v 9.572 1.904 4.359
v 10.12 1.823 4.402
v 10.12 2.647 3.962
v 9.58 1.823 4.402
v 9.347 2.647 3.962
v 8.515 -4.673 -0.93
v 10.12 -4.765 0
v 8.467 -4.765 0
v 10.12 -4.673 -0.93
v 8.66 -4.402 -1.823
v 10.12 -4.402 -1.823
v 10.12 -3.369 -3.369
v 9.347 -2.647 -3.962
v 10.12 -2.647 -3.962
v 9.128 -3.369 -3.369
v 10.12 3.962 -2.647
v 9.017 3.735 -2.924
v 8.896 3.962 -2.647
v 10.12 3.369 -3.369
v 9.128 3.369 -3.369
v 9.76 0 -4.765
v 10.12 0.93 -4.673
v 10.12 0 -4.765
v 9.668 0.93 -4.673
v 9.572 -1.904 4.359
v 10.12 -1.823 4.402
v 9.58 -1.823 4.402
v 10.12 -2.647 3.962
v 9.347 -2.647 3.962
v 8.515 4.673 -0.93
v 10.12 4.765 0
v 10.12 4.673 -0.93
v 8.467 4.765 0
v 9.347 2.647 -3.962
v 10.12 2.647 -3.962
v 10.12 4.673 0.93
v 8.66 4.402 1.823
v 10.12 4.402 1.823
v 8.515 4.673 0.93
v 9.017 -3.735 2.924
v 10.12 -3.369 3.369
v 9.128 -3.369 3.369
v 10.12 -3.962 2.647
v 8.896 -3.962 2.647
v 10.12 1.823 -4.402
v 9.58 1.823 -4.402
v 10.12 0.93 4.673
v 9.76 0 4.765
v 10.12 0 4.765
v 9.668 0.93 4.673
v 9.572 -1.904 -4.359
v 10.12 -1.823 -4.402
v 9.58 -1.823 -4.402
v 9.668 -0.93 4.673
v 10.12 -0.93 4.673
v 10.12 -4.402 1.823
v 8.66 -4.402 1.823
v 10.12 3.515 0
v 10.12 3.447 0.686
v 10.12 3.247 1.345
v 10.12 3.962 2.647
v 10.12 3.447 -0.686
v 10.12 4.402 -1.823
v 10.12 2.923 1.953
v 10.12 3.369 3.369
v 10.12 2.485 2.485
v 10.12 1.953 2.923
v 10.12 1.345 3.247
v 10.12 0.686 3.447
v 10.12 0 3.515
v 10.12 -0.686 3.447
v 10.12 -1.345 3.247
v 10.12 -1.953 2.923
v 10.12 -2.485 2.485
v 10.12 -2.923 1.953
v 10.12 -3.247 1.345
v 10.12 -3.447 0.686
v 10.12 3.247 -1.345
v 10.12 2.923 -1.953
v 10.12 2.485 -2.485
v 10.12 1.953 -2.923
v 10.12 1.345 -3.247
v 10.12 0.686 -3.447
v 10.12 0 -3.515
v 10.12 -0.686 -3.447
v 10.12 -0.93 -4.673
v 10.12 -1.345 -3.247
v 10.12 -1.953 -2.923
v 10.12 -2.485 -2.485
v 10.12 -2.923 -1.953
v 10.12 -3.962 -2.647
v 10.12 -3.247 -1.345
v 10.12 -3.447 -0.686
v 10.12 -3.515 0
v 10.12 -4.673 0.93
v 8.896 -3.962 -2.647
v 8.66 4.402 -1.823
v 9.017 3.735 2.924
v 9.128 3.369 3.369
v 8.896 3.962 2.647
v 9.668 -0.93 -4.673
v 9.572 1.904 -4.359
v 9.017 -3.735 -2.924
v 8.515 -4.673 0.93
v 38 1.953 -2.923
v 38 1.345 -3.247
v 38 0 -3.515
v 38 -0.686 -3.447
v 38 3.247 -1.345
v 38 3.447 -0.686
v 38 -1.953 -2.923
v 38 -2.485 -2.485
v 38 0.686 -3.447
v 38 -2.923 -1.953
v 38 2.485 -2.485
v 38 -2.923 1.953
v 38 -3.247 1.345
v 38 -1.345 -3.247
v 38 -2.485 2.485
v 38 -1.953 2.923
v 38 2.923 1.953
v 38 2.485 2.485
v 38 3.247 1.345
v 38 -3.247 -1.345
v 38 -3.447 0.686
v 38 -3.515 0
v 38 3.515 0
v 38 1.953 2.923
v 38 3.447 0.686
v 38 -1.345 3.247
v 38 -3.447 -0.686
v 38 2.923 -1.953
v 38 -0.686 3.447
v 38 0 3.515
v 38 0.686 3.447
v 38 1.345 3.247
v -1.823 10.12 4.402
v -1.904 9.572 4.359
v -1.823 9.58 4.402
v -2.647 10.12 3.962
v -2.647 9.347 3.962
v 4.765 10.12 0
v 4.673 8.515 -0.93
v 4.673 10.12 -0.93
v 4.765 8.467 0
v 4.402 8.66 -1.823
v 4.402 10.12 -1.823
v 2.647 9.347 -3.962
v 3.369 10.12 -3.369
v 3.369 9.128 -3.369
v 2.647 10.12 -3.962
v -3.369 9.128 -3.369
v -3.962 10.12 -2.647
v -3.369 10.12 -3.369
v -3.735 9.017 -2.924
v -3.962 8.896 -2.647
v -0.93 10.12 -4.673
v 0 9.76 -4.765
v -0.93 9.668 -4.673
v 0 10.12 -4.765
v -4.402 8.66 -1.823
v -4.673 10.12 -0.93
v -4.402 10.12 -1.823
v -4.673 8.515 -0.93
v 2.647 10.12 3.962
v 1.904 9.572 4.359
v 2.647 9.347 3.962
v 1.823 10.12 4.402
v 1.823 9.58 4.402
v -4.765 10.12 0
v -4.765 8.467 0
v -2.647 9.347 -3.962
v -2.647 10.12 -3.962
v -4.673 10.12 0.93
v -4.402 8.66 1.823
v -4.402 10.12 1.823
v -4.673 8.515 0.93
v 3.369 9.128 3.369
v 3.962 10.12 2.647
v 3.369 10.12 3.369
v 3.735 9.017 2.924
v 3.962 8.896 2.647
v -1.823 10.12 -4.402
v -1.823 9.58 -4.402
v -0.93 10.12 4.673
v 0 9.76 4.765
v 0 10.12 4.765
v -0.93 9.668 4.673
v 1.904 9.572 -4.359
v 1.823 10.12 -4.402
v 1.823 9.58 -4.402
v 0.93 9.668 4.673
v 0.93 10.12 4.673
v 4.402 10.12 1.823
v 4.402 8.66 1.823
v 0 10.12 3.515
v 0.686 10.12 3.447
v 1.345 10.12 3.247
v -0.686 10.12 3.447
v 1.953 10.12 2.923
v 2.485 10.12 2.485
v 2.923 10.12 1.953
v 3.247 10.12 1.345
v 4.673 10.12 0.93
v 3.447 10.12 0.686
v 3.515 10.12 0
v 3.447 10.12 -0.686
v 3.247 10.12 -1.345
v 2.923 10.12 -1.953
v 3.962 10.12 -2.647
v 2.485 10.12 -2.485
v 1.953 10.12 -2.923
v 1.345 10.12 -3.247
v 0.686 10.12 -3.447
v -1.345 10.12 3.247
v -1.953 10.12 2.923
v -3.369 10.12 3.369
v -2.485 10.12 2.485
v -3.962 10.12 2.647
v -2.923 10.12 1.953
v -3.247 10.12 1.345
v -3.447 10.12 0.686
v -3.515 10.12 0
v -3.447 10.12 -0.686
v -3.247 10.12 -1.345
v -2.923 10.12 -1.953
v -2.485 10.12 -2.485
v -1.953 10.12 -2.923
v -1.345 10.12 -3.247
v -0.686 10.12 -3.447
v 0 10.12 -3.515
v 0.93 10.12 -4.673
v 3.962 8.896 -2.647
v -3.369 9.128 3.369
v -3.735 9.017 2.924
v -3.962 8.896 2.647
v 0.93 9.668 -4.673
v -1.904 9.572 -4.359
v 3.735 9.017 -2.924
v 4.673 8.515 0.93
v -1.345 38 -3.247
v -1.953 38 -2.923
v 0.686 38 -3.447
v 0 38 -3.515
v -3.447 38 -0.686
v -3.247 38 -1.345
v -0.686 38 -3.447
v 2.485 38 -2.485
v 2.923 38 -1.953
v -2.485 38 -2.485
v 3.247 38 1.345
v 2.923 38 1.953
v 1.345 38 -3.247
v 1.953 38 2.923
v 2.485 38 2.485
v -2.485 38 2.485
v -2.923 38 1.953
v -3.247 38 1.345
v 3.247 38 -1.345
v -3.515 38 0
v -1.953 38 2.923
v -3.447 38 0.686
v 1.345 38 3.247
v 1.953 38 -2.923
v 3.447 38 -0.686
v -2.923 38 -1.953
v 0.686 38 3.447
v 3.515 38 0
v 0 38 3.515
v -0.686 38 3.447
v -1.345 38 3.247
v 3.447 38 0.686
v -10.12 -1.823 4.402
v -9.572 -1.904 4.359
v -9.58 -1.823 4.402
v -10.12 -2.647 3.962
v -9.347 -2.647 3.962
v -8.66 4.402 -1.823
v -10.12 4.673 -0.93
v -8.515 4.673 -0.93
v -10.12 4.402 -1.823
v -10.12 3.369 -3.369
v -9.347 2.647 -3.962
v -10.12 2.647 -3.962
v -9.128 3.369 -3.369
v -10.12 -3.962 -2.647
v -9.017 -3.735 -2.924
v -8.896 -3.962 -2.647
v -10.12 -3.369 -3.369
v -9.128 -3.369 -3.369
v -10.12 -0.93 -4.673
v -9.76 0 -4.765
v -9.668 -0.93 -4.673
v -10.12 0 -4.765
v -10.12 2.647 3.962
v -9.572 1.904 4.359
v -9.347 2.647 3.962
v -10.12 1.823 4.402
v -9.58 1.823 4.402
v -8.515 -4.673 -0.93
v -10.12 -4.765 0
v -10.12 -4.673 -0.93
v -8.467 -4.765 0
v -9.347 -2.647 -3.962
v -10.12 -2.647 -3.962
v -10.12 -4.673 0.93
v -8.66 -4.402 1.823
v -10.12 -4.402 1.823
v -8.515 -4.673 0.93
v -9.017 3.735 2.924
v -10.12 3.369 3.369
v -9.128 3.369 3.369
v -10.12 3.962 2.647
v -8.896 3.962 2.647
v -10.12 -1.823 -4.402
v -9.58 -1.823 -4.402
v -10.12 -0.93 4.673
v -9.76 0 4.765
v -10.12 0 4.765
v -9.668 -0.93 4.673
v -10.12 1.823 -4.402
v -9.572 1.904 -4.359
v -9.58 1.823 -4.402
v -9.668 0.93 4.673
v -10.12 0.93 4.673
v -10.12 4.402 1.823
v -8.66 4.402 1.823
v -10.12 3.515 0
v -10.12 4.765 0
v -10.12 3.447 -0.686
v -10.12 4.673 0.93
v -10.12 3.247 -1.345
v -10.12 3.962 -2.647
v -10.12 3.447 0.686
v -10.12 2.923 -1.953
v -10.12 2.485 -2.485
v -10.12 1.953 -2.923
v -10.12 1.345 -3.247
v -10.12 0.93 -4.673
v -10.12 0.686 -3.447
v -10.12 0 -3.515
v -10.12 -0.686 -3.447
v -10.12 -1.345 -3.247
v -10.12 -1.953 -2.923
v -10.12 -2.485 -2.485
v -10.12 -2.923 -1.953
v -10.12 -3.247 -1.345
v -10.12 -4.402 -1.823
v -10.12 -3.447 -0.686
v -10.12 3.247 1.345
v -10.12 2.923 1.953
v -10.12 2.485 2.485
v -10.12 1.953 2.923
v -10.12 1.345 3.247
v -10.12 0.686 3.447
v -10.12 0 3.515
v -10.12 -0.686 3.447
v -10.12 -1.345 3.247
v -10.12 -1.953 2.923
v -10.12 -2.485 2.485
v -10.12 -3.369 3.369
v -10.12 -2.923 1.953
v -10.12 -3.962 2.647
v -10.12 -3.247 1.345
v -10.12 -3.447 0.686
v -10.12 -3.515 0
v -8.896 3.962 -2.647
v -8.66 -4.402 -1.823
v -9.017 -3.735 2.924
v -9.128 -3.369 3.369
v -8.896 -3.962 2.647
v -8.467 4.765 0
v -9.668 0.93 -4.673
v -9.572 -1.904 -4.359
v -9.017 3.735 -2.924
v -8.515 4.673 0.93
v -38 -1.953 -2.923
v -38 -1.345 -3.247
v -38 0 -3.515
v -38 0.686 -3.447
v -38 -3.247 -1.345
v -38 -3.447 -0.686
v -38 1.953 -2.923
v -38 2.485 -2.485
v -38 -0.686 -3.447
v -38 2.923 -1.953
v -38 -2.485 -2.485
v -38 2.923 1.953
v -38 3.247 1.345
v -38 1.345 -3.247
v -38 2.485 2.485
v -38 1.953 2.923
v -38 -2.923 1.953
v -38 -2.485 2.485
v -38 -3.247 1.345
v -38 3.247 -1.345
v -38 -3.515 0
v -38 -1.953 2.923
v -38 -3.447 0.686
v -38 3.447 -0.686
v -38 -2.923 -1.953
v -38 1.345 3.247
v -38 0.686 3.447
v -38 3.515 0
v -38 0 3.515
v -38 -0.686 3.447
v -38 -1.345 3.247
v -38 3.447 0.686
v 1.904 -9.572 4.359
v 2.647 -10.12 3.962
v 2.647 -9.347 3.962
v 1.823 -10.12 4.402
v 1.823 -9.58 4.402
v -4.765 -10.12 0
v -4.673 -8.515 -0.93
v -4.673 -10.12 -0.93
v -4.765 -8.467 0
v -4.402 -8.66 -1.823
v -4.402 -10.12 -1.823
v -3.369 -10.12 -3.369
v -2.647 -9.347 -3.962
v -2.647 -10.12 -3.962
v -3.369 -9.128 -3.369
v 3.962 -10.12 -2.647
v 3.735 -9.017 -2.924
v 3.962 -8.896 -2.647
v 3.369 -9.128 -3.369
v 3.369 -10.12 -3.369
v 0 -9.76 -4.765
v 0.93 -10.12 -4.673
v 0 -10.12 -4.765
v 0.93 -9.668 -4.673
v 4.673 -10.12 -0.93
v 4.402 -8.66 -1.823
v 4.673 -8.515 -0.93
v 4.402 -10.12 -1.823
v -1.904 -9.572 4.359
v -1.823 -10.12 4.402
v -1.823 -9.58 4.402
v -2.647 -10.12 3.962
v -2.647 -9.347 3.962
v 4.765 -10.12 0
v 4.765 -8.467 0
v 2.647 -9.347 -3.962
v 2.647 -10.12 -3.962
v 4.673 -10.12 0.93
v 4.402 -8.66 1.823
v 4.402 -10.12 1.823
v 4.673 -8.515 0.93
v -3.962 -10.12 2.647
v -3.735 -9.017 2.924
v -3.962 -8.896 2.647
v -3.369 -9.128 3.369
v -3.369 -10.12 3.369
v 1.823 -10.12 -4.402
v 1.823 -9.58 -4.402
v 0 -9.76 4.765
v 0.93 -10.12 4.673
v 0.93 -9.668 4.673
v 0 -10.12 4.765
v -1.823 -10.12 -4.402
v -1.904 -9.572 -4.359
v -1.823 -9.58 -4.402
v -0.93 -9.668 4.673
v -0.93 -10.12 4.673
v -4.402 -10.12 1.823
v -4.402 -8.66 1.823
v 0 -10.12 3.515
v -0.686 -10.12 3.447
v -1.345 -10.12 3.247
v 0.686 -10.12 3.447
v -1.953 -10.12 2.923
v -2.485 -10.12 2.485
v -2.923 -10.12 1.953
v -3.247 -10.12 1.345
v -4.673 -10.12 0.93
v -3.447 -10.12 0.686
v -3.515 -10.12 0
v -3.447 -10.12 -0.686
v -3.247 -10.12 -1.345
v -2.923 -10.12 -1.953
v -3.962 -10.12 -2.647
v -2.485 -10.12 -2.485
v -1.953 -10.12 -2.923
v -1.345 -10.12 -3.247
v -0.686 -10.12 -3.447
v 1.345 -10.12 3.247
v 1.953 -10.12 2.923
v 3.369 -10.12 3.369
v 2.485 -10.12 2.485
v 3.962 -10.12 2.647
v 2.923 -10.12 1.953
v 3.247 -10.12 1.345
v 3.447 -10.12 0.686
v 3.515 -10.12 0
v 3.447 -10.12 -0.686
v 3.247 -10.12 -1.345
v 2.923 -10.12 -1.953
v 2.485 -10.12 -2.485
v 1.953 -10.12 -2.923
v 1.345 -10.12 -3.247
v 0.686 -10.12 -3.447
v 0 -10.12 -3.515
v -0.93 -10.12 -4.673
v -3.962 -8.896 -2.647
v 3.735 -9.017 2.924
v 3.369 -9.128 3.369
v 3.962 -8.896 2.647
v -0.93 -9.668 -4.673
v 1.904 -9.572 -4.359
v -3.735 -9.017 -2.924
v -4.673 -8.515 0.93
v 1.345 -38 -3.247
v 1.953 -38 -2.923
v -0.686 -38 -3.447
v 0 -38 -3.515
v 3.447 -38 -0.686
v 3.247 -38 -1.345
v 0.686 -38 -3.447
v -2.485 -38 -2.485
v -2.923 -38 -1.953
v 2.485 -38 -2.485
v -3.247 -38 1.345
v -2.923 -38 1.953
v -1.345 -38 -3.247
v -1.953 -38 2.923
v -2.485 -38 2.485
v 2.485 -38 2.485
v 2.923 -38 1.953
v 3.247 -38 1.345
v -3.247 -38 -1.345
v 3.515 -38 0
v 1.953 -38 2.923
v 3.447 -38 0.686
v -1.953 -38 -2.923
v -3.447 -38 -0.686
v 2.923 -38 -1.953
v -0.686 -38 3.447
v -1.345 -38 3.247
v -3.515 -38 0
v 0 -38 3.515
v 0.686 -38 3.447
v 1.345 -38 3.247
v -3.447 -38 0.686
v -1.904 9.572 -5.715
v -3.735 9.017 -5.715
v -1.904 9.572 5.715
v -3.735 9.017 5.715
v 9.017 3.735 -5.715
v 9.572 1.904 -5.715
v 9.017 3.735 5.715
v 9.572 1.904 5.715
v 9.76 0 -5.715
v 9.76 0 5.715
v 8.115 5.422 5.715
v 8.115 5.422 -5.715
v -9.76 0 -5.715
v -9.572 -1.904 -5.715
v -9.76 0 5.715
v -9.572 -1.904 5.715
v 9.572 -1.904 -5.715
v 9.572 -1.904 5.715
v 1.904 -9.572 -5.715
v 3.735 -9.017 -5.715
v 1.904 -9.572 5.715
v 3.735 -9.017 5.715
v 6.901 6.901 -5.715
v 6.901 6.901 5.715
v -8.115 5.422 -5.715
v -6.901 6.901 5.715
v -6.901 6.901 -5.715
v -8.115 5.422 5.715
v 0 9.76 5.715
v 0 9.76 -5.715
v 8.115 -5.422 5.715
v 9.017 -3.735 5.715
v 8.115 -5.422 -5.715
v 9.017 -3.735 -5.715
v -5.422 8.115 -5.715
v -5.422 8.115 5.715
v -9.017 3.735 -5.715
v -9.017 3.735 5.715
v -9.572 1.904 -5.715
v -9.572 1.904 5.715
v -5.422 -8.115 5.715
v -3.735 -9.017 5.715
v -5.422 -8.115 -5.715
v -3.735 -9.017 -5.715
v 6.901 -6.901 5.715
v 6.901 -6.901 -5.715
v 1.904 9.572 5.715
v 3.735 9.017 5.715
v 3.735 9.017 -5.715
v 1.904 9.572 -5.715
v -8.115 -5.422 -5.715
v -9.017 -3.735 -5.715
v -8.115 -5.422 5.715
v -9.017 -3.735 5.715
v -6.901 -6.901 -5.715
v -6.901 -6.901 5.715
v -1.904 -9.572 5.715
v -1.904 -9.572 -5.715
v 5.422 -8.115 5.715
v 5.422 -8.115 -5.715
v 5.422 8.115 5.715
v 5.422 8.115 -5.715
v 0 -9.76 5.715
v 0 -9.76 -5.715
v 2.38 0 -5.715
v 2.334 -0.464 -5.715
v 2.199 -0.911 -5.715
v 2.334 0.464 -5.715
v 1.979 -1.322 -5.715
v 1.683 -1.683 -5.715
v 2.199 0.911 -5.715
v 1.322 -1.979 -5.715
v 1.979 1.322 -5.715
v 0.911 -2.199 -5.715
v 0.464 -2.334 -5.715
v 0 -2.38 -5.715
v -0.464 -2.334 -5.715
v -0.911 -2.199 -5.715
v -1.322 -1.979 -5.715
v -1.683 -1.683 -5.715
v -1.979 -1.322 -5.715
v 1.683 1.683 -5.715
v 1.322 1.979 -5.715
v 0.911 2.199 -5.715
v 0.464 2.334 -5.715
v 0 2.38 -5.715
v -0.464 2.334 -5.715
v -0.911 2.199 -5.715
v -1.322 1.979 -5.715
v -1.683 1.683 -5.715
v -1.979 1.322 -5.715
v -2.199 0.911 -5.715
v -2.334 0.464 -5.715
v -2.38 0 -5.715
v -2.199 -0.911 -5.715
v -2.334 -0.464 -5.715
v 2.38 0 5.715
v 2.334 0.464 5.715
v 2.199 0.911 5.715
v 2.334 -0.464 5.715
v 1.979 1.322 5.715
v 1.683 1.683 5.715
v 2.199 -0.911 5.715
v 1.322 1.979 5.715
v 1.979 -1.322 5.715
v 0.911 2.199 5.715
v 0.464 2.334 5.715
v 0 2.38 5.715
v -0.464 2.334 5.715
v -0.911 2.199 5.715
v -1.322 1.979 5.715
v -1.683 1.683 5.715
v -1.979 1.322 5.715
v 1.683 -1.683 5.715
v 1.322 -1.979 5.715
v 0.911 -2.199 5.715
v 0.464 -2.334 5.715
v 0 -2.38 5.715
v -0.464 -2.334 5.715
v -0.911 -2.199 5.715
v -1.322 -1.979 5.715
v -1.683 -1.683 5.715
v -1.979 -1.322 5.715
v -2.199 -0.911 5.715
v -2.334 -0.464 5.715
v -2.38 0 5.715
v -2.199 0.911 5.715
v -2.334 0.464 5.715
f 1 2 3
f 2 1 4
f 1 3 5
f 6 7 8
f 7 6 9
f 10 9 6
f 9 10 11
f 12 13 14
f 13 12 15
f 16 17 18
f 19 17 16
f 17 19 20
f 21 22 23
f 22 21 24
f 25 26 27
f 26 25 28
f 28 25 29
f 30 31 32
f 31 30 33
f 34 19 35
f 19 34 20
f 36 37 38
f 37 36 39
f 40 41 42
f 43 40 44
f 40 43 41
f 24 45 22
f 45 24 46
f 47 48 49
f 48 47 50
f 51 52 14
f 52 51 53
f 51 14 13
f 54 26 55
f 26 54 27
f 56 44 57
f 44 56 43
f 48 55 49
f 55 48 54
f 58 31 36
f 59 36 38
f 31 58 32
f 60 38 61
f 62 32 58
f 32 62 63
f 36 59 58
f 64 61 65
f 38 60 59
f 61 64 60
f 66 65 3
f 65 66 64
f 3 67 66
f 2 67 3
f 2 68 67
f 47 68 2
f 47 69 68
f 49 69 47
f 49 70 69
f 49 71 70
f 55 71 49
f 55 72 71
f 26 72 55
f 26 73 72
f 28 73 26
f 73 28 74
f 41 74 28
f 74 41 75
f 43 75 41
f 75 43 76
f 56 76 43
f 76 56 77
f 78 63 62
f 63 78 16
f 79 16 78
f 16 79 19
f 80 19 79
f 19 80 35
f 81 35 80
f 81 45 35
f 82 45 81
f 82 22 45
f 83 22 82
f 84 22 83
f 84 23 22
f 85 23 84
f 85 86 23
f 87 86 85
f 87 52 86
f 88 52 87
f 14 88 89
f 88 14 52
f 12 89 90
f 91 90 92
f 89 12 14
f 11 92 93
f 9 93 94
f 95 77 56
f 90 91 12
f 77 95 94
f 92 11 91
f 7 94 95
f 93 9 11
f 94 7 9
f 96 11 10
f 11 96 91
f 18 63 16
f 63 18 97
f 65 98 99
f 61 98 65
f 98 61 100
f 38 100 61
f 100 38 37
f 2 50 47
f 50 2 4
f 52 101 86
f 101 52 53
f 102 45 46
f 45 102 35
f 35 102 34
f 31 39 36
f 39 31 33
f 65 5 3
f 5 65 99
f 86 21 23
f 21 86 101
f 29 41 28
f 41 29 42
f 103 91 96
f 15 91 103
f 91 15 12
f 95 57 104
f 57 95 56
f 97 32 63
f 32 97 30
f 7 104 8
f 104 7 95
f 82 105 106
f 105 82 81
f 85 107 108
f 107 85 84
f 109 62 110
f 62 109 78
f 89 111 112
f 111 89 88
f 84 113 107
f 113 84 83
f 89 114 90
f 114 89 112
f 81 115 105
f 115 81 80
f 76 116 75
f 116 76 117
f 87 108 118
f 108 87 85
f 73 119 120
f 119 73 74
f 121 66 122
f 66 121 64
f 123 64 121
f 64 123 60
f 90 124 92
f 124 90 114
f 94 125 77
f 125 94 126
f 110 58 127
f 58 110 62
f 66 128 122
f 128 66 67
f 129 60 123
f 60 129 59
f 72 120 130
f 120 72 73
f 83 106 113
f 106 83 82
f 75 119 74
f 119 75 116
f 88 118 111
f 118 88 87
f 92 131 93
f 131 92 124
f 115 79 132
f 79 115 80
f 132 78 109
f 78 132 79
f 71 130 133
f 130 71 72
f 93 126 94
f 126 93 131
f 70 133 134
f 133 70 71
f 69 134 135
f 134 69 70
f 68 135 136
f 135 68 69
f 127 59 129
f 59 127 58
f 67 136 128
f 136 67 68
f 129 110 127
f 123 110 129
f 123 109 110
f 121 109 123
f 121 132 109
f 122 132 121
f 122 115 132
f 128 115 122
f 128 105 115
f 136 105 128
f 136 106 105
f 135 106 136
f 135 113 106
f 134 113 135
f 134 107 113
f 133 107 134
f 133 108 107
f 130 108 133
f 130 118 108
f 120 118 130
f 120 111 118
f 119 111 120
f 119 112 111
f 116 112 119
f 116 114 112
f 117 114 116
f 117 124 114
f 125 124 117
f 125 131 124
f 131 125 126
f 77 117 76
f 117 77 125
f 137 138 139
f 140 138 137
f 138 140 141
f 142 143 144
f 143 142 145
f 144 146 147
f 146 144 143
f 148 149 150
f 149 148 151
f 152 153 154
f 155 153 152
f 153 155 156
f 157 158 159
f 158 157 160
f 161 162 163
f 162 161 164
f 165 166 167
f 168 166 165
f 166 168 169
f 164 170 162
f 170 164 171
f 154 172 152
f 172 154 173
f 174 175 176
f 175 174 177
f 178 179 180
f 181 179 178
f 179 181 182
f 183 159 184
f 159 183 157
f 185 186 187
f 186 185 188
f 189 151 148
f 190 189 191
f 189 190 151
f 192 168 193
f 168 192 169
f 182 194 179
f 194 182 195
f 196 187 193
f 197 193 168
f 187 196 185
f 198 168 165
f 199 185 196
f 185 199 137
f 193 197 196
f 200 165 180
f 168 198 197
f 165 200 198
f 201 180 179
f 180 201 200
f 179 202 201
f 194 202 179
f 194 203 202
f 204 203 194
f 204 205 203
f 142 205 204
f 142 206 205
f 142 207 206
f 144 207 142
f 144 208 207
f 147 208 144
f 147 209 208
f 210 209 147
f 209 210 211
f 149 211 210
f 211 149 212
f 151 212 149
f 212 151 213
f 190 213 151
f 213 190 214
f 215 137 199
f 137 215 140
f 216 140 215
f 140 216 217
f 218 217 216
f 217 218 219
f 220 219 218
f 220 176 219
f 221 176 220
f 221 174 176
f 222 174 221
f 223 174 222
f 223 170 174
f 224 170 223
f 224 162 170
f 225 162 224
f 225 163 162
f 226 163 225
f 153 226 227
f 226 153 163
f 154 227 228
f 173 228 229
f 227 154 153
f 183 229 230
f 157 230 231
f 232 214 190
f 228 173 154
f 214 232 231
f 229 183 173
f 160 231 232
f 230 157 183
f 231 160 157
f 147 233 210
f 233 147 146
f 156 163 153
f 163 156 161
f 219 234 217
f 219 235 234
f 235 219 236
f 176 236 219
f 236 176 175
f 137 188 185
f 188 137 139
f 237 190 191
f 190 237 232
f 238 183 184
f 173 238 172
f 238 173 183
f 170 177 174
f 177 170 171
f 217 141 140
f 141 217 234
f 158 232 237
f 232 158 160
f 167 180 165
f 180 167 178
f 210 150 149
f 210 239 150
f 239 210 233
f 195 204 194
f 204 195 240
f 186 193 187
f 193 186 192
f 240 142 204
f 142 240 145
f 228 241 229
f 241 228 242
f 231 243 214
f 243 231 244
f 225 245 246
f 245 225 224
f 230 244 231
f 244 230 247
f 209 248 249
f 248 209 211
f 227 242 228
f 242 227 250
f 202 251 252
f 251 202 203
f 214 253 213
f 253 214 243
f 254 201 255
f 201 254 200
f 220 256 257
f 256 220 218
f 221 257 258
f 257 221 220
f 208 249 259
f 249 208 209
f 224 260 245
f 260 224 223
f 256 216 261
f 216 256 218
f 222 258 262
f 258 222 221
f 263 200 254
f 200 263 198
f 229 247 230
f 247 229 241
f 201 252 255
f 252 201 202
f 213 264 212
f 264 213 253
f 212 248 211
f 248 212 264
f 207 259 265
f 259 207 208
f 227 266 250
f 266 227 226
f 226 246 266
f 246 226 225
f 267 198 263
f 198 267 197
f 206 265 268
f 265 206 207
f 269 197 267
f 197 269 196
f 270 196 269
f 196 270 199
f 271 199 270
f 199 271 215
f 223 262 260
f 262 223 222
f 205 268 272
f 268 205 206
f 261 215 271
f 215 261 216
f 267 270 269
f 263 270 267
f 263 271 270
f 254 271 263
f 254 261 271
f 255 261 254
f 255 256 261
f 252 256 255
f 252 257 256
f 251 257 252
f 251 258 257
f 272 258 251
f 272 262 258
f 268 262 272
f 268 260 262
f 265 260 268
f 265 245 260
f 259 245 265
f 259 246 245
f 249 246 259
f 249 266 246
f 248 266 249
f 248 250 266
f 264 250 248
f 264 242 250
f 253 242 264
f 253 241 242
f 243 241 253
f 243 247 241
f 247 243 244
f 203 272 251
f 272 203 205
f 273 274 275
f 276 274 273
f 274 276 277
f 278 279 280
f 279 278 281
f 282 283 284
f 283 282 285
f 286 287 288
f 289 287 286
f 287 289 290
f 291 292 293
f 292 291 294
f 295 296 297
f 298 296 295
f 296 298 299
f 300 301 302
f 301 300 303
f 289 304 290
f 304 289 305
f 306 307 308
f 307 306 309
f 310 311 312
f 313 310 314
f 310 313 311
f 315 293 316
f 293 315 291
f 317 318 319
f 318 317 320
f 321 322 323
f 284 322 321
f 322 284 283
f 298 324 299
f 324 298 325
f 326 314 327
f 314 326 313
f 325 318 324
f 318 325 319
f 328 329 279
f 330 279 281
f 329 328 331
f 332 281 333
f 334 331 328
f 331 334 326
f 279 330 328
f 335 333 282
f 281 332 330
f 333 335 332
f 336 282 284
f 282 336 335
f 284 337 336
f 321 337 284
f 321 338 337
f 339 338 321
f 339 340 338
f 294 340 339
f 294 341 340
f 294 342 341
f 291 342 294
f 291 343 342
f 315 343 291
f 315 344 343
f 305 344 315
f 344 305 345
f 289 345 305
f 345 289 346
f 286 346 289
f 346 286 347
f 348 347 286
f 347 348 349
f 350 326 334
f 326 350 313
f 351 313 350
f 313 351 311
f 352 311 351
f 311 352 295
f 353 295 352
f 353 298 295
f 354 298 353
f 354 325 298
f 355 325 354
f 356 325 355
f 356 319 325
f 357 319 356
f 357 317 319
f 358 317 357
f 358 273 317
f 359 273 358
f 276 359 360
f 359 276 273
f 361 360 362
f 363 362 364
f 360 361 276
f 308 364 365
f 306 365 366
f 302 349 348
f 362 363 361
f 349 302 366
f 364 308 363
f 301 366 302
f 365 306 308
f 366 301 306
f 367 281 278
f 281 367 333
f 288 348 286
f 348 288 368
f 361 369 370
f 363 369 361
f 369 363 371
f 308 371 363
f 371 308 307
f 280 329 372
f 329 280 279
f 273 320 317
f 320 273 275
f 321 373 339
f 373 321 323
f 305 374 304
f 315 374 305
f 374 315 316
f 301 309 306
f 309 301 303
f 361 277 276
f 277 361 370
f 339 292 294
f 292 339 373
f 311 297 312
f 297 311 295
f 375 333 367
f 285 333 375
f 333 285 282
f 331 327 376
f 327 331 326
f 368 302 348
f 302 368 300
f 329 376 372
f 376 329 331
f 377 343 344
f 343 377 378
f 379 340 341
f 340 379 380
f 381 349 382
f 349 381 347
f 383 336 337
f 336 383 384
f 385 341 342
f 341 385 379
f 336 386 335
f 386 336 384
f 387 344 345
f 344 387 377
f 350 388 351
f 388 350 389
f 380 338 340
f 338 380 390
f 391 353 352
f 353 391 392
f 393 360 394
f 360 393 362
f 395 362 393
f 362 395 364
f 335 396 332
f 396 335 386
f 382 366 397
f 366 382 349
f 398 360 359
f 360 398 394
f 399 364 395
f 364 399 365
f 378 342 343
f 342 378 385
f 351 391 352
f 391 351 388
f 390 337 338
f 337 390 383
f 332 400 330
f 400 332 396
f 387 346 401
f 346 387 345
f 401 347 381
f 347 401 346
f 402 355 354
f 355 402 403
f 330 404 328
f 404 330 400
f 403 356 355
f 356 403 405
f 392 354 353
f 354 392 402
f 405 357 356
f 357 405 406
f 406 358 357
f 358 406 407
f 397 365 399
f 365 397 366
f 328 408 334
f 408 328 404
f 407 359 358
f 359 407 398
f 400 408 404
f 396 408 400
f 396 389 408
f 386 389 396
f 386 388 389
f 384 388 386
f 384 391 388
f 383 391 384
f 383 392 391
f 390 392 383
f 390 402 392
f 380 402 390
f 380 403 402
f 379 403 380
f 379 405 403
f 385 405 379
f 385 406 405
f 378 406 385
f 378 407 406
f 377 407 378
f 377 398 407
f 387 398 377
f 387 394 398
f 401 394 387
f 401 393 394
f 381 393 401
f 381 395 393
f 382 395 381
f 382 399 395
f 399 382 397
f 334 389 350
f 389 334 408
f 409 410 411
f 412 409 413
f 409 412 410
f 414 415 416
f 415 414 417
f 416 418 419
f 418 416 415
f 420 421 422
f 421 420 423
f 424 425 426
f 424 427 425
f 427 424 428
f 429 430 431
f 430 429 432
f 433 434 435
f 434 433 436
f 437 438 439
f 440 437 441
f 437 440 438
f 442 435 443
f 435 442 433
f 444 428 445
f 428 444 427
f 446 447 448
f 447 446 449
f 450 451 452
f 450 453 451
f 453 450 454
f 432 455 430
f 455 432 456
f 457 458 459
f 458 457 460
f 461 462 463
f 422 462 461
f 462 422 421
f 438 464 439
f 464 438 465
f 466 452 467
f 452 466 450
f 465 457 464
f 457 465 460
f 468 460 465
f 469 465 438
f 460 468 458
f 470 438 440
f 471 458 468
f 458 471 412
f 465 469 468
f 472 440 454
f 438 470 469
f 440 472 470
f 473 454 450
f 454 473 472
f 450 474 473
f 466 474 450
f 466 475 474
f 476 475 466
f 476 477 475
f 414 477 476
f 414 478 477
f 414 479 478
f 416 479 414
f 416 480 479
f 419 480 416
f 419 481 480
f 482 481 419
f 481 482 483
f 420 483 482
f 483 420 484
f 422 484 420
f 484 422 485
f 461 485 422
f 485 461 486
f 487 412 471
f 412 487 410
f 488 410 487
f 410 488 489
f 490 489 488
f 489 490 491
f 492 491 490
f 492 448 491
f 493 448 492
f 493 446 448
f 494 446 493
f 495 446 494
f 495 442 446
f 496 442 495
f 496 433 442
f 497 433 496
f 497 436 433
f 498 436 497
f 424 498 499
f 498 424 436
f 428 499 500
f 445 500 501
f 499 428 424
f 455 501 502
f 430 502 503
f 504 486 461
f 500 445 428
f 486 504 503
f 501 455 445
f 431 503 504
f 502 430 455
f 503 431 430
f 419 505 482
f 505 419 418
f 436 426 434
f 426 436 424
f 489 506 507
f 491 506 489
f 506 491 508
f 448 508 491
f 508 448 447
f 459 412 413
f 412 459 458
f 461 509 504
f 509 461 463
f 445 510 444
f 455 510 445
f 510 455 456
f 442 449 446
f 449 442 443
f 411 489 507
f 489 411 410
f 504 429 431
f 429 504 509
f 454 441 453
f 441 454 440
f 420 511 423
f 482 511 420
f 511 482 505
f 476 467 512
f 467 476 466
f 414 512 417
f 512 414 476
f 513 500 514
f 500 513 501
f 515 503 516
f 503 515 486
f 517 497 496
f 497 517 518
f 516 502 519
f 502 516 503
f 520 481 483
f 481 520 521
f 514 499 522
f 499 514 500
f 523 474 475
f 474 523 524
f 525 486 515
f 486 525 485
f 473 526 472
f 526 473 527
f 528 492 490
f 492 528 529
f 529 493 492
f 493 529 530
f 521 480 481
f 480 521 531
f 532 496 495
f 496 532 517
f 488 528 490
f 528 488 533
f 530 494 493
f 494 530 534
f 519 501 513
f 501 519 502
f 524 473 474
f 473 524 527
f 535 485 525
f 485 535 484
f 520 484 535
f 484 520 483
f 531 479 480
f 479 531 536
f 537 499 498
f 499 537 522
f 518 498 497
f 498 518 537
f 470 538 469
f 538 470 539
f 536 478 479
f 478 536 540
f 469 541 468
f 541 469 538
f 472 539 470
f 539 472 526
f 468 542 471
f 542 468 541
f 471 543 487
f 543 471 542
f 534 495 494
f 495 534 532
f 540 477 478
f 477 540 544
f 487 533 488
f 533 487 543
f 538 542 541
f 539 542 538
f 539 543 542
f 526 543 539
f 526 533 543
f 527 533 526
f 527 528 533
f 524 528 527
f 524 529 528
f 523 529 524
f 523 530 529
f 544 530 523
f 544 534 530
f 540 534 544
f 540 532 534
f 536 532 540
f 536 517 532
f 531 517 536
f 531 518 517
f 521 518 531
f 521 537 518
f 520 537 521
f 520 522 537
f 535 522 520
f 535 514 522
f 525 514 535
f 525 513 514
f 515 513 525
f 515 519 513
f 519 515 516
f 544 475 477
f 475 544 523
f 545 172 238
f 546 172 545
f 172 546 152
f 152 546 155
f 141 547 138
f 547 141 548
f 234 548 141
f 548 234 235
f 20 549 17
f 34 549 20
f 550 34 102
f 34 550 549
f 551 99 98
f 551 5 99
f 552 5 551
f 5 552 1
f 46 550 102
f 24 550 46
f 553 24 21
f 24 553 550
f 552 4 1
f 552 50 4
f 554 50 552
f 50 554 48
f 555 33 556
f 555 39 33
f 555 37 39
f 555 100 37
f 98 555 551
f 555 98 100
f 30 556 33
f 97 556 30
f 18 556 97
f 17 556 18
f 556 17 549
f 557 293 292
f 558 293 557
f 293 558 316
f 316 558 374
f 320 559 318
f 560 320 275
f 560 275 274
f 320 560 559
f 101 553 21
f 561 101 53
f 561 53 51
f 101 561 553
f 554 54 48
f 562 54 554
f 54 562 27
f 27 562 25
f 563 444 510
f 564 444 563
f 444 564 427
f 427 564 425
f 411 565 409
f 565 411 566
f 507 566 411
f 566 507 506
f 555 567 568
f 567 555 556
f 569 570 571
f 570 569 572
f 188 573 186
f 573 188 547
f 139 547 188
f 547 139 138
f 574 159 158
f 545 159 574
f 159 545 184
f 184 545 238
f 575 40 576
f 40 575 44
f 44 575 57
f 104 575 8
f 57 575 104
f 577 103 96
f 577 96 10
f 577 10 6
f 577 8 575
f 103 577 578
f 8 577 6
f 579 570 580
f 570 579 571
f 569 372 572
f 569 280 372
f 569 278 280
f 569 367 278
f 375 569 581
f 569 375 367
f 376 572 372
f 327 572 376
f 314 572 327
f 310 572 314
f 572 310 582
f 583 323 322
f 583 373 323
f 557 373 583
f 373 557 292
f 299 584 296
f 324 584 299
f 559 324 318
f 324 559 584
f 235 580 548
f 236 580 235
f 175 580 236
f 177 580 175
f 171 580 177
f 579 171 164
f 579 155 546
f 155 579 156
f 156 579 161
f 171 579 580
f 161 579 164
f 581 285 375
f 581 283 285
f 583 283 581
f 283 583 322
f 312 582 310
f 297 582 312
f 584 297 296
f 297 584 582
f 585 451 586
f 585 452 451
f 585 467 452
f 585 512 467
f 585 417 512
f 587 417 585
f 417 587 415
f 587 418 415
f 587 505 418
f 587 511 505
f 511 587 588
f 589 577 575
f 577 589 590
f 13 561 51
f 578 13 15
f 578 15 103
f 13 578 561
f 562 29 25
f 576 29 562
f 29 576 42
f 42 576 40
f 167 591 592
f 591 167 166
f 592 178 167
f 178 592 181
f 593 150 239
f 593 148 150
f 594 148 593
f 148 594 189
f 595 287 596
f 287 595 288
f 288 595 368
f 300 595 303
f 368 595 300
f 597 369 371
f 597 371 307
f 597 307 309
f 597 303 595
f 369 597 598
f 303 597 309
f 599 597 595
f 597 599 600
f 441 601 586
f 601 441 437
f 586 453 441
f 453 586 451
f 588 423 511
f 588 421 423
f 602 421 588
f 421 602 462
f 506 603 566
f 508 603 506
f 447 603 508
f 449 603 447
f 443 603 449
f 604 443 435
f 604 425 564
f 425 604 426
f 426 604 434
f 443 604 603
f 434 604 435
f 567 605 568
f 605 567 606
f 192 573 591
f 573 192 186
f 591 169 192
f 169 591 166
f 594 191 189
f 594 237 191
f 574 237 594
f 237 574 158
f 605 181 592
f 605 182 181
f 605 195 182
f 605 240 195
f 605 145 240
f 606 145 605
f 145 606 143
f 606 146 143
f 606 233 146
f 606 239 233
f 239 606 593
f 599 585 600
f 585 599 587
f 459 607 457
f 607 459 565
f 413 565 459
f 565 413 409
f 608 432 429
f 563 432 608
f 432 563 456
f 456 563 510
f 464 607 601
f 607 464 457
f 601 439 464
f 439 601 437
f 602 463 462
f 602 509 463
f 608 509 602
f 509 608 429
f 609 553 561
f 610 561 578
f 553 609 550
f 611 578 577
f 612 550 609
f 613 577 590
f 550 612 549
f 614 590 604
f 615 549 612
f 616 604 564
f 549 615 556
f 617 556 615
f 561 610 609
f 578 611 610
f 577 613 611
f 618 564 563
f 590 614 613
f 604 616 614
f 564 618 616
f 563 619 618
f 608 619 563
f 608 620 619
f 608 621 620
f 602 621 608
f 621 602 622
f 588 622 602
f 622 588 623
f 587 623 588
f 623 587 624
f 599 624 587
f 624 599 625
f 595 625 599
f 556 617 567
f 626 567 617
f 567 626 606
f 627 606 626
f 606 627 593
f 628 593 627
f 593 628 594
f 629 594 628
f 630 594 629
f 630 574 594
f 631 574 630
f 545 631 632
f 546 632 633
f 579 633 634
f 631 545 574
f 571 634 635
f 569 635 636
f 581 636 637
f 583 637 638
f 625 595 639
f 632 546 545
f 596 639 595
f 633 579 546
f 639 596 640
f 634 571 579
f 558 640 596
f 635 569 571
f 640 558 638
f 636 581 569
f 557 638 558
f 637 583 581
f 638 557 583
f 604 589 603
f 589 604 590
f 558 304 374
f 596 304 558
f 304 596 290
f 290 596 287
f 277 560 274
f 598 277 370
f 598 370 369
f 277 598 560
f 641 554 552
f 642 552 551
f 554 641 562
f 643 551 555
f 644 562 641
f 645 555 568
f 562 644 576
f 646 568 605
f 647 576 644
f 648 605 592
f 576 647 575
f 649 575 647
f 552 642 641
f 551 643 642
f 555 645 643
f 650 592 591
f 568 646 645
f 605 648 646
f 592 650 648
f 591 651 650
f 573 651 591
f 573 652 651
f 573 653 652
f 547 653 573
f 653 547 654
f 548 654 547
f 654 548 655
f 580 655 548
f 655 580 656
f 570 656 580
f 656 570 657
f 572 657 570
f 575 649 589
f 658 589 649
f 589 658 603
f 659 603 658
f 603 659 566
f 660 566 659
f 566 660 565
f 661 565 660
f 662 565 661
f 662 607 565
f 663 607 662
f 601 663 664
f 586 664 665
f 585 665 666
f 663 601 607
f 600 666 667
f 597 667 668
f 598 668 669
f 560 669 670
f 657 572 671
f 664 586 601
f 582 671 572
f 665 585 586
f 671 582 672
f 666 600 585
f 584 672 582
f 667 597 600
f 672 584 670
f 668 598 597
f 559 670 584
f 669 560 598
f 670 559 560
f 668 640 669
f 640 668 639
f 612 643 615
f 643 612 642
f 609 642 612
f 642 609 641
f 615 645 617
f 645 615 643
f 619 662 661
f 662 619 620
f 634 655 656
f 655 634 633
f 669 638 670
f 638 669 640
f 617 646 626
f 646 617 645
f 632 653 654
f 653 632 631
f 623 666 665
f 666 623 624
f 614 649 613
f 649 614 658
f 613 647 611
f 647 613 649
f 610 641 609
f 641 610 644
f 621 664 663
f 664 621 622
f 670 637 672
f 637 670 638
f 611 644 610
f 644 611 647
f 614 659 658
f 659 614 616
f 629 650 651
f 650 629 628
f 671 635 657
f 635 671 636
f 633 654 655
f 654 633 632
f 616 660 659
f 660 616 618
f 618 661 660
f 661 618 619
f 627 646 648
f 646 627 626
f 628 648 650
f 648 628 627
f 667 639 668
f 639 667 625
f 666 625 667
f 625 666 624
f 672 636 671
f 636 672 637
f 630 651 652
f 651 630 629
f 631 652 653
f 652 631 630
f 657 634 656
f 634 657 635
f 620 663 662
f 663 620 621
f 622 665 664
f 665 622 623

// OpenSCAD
$fn = 32;
// ----------------------------------------------------------------------
// Cardan cross: 76 mm span, 9.53 mm trunnions
// ----------------------------------------------------------------------

// --- parameters (mm) ---
journal_d = 9.53;         // trunnion diameter
arm_len = 38;             // trunnion length from the centre
step_r = 3.24;            // step position from the centre
step_d = 7.03;            // journal diameter after the step
hub_d = 19.52;            // hub diameter
hub_h = 11.43;            // hub height
bore_d = 4.76;            // hub bore

difference() {
  union() {
    /* hub along the joint axis */
    cylinder(h = hub_h, d = hub_d, center = true);
    for (a = [0 : 90 : 270]) rotate([0, 0, a]) {
      /* trunnion, sunk into the hub */
      translate([hub_d / 4, 0, 0]) rotate([0, 90, 0]) cylinder(h = step_r + 2, d = journal_d);
      /* stepped journal out to the tip */
      translate([step_r - 0.5, 0, 0]) rotate([0, 90, 0]) cylinder(h = arm_len + 0.5 - step_r, d = step_d);
    }
  }
  /* lubrication bore through the hub, 2.5 mm clear on both sides */
  translate([0, 0, -hub_h / 2 - 2.5]) cylinder(h = hub_h + 5, d = bore_d);
}
